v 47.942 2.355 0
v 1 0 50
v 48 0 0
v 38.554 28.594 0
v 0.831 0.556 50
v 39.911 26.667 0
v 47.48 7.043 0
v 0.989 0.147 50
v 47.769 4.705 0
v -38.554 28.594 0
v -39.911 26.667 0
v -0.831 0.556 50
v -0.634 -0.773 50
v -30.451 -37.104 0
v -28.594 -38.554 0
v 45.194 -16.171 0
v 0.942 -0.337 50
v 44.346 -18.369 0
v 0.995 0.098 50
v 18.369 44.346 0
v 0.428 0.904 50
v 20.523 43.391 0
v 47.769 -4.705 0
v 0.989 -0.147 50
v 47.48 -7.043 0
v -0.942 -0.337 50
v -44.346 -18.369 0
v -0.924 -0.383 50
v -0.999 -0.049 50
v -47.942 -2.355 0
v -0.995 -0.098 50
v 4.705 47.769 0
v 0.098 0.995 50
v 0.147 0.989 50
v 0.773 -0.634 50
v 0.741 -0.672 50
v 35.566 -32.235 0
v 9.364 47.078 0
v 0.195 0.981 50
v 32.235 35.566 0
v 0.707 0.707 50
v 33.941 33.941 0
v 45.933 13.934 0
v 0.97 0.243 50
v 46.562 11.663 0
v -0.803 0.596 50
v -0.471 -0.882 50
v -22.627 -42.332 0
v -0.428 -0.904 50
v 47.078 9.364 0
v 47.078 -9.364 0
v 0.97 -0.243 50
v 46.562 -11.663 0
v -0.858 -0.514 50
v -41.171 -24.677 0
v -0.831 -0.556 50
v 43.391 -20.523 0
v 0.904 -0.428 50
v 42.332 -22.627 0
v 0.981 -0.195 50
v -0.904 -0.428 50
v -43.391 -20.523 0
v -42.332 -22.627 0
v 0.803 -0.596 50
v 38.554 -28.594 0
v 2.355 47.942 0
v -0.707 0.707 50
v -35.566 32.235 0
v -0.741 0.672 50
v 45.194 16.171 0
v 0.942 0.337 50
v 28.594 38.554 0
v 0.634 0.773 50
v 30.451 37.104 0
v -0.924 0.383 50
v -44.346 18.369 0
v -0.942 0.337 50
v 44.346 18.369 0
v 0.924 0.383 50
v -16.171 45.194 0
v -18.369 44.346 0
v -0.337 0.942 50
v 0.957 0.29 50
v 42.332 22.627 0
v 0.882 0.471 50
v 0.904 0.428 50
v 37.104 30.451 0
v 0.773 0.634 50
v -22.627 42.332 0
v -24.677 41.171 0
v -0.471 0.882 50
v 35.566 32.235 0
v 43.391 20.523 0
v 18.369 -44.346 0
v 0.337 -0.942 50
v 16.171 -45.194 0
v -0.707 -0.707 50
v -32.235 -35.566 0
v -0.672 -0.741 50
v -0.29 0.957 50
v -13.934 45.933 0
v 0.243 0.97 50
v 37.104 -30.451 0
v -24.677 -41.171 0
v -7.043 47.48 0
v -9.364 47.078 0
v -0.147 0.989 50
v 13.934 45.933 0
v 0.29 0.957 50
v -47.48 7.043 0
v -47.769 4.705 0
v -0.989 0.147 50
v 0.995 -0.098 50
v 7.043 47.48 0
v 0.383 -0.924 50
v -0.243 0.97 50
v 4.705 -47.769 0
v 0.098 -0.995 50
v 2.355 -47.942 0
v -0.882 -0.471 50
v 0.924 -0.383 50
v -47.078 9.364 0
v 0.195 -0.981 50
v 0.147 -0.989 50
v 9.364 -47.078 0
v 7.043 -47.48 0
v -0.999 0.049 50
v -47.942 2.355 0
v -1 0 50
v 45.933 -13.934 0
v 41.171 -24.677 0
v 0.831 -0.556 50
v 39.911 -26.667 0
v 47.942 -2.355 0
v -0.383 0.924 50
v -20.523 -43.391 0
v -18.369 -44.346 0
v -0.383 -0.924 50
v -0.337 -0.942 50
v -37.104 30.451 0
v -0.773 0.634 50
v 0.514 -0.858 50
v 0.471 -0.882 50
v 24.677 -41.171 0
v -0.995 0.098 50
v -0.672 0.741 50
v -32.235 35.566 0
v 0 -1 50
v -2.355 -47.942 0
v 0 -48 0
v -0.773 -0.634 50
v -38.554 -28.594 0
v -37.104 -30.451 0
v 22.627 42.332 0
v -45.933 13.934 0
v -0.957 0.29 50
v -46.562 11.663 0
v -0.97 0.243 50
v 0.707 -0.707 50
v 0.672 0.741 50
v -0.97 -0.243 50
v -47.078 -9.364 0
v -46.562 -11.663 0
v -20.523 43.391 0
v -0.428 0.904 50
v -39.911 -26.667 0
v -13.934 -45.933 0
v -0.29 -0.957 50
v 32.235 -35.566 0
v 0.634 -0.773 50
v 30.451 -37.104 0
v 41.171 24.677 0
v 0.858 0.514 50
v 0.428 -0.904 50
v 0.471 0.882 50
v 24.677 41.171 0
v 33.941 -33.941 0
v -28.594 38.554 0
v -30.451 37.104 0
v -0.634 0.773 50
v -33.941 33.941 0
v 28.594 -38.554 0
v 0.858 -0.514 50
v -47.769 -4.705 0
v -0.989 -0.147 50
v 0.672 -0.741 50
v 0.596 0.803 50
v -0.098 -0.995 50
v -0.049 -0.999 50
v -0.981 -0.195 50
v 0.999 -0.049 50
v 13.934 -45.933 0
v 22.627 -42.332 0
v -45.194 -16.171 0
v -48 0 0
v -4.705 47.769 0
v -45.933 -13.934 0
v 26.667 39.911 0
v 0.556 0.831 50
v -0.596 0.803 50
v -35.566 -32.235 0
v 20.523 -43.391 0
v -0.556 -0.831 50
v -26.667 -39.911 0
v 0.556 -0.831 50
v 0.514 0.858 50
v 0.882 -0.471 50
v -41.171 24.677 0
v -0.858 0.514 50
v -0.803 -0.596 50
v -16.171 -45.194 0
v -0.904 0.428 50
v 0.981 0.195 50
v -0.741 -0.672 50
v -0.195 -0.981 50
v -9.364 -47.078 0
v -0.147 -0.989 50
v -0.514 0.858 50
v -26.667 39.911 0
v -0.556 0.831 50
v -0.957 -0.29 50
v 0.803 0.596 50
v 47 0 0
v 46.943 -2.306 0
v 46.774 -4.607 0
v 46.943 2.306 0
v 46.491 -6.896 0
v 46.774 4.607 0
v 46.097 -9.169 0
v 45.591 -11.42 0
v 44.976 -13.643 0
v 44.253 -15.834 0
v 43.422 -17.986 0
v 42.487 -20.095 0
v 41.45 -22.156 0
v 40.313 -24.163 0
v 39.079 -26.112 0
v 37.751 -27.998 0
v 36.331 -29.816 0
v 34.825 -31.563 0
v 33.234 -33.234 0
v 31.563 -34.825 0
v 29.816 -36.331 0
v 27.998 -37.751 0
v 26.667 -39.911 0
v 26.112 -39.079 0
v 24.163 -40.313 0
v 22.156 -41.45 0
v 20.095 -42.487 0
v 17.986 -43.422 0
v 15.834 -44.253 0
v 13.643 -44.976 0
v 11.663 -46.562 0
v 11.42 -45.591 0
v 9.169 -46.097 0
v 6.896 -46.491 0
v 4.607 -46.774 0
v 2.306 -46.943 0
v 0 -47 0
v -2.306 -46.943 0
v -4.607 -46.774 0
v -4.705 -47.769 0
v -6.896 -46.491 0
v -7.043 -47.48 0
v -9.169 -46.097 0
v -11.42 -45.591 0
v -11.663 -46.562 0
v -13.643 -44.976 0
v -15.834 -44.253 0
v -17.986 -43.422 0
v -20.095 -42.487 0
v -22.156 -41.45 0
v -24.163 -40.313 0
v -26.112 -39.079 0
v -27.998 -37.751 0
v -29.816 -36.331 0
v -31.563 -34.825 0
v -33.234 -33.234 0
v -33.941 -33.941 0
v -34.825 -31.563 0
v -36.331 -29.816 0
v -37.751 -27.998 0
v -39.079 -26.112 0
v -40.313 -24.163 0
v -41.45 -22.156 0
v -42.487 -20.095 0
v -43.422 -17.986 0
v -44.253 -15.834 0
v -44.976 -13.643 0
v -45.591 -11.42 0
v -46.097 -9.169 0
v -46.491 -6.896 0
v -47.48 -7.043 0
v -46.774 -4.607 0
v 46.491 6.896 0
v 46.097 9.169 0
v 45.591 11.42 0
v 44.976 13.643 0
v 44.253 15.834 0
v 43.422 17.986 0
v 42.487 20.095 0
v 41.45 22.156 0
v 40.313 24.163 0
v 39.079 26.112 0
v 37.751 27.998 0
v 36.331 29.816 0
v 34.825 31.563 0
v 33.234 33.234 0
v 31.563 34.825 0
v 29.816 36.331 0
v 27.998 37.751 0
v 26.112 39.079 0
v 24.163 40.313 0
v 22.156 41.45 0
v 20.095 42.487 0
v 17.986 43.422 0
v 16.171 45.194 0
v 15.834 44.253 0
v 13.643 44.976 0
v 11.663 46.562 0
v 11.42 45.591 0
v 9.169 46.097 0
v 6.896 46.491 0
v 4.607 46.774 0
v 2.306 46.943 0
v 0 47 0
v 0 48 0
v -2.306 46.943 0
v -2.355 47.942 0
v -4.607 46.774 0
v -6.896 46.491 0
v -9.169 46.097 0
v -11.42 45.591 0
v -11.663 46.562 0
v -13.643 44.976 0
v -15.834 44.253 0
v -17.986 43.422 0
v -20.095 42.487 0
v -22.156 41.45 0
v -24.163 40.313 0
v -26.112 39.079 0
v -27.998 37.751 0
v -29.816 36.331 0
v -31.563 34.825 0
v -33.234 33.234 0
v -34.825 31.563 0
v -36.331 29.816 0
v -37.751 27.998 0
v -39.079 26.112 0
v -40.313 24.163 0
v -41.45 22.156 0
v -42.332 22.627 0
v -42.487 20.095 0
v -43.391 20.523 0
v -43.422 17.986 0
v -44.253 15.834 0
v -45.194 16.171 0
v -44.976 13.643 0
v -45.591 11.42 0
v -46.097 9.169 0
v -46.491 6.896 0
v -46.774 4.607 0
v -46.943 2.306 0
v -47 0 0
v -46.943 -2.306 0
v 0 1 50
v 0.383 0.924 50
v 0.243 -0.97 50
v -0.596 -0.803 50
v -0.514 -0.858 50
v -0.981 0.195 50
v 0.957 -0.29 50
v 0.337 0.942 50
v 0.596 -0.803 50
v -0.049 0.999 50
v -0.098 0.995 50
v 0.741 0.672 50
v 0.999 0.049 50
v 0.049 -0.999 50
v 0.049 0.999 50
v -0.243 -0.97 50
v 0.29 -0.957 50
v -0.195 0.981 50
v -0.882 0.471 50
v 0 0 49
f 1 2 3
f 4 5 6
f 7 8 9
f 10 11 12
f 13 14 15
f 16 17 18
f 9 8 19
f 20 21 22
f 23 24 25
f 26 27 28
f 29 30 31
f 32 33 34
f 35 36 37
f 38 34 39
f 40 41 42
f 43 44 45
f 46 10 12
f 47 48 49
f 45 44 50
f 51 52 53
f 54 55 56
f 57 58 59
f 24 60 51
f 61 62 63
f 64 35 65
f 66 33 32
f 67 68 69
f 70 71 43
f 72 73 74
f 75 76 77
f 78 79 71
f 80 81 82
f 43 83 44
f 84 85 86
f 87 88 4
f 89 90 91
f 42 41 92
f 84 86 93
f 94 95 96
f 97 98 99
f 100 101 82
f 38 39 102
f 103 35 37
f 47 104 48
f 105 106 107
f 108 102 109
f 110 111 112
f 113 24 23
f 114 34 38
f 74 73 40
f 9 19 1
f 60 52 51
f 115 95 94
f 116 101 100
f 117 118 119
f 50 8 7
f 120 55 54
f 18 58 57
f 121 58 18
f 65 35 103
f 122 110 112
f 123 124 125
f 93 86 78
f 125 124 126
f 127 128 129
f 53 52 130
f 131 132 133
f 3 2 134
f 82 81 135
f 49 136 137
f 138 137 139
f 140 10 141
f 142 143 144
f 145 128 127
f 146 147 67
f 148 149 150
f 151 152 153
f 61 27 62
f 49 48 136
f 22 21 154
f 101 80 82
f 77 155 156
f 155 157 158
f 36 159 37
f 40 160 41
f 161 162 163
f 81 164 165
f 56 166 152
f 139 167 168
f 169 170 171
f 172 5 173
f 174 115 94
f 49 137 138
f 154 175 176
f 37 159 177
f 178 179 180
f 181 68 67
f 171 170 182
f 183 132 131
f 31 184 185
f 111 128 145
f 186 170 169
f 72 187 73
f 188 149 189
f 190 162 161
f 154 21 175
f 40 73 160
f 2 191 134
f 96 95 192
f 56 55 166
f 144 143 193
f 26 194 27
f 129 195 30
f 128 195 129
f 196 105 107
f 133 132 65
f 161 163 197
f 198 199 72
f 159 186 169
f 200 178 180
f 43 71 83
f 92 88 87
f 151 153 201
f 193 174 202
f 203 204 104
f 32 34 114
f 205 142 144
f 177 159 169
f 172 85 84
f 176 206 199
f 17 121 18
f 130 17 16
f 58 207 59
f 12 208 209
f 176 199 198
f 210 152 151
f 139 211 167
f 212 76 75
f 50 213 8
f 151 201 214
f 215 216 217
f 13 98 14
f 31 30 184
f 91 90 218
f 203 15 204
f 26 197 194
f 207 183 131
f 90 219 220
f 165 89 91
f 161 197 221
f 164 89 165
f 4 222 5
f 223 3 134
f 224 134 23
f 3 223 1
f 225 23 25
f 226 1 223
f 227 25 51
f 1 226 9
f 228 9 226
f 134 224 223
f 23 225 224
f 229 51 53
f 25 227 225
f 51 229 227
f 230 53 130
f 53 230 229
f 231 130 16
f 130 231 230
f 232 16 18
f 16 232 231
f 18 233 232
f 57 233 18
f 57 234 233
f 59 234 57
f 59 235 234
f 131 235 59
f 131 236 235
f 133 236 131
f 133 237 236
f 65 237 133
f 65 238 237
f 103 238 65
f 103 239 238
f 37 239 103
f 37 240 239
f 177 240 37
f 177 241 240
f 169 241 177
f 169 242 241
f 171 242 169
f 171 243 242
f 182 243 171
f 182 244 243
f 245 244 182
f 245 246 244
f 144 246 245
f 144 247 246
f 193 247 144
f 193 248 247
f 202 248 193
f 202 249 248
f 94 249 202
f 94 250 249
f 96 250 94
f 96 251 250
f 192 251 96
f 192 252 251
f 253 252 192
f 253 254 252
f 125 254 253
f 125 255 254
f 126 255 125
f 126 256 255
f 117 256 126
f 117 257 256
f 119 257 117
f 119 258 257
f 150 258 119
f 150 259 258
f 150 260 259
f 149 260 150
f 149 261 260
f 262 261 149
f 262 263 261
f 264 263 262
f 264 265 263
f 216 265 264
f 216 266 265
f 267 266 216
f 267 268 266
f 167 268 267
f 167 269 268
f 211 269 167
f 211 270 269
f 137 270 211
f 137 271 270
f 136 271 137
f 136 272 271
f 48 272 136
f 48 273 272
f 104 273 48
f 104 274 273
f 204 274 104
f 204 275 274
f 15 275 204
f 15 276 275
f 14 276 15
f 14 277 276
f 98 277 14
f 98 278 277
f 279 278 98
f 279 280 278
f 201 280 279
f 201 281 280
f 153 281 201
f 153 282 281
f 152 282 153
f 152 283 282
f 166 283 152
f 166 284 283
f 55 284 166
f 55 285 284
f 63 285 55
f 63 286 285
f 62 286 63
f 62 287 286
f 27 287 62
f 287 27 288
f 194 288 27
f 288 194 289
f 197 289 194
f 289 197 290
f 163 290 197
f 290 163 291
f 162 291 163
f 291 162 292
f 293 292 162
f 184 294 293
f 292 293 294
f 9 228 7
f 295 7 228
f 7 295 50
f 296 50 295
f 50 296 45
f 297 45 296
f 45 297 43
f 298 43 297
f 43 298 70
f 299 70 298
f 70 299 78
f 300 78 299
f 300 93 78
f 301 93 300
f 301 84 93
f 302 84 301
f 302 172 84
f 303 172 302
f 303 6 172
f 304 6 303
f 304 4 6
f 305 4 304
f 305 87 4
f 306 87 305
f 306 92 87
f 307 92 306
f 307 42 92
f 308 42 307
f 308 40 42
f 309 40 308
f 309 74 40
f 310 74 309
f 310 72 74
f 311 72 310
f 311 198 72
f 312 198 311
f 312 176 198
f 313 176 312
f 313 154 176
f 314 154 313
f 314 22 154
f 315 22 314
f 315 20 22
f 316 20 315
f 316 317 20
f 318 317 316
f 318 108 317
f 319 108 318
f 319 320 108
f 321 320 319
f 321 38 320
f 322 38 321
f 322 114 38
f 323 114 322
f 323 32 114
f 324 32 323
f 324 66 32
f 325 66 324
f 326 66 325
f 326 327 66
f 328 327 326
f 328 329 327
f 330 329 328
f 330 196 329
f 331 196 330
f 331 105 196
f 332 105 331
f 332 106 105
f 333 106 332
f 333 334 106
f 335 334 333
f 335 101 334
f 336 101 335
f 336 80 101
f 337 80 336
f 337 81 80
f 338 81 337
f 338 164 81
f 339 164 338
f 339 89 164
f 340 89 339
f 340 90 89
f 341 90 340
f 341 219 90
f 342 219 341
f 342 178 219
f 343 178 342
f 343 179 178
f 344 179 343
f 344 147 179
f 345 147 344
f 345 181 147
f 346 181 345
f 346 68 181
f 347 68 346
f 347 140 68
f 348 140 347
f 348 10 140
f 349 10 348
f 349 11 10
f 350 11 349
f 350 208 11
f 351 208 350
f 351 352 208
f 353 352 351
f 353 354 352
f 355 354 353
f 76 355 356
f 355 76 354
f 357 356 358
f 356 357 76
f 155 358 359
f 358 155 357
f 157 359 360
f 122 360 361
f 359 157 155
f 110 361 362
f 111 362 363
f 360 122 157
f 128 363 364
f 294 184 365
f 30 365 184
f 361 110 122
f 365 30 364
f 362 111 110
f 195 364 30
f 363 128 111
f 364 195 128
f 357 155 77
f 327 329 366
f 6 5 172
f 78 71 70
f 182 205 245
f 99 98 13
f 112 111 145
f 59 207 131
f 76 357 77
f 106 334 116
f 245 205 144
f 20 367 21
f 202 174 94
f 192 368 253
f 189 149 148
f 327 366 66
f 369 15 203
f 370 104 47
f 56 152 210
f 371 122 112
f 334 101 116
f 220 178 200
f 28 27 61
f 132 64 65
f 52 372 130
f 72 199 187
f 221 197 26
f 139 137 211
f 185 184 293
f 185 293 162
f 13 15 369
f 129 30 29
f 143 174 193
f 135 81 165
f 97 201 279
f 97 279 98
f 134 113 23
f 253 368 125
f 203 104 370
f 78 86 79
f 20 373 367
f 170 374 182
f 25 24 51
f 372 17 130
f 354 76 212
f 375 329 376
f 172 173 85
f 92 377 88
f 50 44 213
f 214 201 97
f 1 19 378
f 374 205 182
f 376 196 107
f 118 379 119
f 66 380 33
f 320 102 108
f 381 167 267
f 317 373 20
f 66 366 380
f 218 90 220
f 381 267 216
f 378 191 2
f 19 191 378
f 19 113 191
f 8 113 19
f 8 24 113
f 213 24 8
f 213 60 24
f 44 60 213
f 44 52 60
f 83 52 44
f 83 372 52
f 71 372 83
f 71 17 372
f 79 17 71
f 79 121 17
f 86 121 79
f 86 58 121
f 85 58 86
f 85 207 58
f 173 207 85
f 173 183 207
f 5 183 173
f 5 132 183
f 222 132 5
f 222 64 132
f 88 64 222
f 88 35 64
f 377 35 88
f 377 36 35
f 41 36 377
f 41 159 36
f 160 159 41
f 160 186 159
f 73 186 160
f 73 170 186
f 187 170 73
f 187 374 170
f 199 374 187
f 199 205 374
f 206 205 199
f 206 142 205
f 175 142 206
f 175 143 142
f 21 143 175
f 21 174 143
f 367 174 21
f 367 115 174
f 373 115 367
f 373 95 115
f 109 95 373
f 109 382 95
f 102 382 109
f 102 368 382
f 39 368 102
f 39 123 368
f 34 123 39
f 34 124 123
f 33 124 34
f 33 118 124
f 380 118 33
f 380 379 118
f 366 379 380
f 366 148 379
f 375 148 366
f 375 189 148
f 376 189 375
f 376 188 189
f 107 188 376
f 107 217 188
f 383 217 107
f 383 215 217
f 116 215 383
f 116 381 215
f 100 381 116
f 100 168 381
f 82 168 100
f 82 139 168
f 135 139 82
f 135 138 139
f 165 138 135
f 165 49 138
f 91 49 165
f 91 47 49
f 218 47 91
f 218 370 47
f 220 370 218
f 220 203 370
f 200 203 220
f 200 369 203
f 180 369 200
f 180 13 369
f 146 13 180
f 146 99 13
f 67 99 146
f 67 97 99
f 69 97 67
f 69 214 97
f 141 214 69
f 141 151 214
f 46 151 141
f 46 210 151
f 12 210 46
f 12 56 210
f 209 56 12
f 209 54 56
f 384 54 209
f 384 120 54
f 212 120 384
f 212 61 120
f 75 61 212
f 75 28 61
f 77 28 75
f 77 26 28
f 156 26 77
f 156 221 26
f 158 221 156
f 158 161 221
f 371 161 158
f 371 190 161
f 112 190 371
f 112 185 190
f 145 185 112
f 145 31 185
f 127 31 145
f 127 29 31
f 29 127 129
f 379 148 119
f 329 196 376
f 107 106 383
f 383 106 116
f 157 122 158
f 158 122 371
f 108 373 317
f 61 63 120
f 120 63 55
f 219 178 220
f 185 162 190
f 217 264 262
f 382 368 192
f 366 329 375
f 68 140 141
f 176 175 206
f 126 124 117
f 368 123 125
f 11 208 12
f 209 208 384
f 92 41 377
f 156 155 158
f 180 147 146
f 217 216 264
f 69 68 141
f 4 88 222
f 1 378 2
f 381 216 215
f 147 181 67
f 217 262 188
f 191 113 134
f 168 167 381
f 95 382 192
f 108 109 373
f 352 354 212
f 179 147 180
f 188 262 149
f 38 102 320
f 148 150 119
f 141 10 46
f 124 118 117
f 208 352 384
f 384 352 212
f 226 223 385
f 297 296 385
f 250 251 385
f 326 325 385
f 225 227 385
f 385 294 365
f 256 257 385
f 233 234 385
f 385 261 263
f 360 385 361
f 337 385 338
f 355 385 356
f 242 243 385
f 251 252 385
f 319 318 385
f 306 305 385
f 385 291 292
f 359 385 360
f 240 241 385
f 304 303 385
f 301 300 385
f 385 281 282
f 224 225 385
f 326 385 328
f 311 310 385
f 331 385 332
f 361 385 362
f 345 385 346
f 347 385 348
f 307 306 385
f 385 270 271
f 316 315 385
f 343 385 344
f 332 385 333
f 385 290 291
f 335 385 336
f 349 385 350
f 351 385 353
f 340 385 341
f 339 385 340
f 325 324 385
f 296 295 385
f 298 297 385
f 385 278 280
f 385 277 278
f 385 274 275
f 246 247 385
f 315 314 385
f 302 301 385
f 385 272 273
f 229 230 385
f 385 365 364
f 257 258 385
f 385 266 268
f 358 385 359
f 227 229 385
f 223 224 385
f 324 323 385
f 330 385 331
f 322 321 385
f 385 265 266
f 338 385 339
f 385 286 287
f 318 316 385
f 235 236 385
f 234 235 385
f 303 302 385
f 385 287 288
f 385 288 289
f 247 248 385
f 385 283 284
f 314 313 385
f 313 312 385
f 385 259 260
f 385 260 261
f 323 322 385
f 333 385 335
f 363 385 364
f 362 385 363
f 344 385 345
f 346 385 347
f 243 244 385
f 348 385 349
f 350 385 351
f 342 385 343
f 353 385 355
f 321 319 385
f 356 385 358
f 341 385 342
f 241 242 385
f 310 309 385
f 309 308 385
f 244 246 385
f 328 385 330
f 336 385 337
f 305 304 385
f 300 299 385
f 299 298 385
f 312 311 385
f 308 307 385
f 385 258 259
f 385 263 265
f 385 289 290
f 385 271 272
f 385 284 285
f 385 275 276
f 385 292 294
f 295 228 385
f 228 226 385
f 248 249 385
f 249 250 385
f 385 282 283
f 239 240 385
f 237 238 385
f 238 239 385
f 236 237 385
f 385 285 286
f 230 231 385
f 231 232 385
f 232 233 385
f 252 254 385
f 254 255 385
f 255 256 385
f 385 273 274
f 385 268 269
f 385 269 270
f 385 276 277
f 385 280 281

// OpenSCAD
$fn=128;

fanD=94;
thickness=1;


module funnel(length=50)
{
    difference()
    {
        cylinder(d1=fanD+thickness*2,d2=thickness*2,h=length);
        cylinder(d1=fanD,d2=0,h=length-thickness);
    }
}

module funnelcutout(length=50)
{
    cylinder(d1=fanD,d2=0,h=length-thickness);
}

funnel();
